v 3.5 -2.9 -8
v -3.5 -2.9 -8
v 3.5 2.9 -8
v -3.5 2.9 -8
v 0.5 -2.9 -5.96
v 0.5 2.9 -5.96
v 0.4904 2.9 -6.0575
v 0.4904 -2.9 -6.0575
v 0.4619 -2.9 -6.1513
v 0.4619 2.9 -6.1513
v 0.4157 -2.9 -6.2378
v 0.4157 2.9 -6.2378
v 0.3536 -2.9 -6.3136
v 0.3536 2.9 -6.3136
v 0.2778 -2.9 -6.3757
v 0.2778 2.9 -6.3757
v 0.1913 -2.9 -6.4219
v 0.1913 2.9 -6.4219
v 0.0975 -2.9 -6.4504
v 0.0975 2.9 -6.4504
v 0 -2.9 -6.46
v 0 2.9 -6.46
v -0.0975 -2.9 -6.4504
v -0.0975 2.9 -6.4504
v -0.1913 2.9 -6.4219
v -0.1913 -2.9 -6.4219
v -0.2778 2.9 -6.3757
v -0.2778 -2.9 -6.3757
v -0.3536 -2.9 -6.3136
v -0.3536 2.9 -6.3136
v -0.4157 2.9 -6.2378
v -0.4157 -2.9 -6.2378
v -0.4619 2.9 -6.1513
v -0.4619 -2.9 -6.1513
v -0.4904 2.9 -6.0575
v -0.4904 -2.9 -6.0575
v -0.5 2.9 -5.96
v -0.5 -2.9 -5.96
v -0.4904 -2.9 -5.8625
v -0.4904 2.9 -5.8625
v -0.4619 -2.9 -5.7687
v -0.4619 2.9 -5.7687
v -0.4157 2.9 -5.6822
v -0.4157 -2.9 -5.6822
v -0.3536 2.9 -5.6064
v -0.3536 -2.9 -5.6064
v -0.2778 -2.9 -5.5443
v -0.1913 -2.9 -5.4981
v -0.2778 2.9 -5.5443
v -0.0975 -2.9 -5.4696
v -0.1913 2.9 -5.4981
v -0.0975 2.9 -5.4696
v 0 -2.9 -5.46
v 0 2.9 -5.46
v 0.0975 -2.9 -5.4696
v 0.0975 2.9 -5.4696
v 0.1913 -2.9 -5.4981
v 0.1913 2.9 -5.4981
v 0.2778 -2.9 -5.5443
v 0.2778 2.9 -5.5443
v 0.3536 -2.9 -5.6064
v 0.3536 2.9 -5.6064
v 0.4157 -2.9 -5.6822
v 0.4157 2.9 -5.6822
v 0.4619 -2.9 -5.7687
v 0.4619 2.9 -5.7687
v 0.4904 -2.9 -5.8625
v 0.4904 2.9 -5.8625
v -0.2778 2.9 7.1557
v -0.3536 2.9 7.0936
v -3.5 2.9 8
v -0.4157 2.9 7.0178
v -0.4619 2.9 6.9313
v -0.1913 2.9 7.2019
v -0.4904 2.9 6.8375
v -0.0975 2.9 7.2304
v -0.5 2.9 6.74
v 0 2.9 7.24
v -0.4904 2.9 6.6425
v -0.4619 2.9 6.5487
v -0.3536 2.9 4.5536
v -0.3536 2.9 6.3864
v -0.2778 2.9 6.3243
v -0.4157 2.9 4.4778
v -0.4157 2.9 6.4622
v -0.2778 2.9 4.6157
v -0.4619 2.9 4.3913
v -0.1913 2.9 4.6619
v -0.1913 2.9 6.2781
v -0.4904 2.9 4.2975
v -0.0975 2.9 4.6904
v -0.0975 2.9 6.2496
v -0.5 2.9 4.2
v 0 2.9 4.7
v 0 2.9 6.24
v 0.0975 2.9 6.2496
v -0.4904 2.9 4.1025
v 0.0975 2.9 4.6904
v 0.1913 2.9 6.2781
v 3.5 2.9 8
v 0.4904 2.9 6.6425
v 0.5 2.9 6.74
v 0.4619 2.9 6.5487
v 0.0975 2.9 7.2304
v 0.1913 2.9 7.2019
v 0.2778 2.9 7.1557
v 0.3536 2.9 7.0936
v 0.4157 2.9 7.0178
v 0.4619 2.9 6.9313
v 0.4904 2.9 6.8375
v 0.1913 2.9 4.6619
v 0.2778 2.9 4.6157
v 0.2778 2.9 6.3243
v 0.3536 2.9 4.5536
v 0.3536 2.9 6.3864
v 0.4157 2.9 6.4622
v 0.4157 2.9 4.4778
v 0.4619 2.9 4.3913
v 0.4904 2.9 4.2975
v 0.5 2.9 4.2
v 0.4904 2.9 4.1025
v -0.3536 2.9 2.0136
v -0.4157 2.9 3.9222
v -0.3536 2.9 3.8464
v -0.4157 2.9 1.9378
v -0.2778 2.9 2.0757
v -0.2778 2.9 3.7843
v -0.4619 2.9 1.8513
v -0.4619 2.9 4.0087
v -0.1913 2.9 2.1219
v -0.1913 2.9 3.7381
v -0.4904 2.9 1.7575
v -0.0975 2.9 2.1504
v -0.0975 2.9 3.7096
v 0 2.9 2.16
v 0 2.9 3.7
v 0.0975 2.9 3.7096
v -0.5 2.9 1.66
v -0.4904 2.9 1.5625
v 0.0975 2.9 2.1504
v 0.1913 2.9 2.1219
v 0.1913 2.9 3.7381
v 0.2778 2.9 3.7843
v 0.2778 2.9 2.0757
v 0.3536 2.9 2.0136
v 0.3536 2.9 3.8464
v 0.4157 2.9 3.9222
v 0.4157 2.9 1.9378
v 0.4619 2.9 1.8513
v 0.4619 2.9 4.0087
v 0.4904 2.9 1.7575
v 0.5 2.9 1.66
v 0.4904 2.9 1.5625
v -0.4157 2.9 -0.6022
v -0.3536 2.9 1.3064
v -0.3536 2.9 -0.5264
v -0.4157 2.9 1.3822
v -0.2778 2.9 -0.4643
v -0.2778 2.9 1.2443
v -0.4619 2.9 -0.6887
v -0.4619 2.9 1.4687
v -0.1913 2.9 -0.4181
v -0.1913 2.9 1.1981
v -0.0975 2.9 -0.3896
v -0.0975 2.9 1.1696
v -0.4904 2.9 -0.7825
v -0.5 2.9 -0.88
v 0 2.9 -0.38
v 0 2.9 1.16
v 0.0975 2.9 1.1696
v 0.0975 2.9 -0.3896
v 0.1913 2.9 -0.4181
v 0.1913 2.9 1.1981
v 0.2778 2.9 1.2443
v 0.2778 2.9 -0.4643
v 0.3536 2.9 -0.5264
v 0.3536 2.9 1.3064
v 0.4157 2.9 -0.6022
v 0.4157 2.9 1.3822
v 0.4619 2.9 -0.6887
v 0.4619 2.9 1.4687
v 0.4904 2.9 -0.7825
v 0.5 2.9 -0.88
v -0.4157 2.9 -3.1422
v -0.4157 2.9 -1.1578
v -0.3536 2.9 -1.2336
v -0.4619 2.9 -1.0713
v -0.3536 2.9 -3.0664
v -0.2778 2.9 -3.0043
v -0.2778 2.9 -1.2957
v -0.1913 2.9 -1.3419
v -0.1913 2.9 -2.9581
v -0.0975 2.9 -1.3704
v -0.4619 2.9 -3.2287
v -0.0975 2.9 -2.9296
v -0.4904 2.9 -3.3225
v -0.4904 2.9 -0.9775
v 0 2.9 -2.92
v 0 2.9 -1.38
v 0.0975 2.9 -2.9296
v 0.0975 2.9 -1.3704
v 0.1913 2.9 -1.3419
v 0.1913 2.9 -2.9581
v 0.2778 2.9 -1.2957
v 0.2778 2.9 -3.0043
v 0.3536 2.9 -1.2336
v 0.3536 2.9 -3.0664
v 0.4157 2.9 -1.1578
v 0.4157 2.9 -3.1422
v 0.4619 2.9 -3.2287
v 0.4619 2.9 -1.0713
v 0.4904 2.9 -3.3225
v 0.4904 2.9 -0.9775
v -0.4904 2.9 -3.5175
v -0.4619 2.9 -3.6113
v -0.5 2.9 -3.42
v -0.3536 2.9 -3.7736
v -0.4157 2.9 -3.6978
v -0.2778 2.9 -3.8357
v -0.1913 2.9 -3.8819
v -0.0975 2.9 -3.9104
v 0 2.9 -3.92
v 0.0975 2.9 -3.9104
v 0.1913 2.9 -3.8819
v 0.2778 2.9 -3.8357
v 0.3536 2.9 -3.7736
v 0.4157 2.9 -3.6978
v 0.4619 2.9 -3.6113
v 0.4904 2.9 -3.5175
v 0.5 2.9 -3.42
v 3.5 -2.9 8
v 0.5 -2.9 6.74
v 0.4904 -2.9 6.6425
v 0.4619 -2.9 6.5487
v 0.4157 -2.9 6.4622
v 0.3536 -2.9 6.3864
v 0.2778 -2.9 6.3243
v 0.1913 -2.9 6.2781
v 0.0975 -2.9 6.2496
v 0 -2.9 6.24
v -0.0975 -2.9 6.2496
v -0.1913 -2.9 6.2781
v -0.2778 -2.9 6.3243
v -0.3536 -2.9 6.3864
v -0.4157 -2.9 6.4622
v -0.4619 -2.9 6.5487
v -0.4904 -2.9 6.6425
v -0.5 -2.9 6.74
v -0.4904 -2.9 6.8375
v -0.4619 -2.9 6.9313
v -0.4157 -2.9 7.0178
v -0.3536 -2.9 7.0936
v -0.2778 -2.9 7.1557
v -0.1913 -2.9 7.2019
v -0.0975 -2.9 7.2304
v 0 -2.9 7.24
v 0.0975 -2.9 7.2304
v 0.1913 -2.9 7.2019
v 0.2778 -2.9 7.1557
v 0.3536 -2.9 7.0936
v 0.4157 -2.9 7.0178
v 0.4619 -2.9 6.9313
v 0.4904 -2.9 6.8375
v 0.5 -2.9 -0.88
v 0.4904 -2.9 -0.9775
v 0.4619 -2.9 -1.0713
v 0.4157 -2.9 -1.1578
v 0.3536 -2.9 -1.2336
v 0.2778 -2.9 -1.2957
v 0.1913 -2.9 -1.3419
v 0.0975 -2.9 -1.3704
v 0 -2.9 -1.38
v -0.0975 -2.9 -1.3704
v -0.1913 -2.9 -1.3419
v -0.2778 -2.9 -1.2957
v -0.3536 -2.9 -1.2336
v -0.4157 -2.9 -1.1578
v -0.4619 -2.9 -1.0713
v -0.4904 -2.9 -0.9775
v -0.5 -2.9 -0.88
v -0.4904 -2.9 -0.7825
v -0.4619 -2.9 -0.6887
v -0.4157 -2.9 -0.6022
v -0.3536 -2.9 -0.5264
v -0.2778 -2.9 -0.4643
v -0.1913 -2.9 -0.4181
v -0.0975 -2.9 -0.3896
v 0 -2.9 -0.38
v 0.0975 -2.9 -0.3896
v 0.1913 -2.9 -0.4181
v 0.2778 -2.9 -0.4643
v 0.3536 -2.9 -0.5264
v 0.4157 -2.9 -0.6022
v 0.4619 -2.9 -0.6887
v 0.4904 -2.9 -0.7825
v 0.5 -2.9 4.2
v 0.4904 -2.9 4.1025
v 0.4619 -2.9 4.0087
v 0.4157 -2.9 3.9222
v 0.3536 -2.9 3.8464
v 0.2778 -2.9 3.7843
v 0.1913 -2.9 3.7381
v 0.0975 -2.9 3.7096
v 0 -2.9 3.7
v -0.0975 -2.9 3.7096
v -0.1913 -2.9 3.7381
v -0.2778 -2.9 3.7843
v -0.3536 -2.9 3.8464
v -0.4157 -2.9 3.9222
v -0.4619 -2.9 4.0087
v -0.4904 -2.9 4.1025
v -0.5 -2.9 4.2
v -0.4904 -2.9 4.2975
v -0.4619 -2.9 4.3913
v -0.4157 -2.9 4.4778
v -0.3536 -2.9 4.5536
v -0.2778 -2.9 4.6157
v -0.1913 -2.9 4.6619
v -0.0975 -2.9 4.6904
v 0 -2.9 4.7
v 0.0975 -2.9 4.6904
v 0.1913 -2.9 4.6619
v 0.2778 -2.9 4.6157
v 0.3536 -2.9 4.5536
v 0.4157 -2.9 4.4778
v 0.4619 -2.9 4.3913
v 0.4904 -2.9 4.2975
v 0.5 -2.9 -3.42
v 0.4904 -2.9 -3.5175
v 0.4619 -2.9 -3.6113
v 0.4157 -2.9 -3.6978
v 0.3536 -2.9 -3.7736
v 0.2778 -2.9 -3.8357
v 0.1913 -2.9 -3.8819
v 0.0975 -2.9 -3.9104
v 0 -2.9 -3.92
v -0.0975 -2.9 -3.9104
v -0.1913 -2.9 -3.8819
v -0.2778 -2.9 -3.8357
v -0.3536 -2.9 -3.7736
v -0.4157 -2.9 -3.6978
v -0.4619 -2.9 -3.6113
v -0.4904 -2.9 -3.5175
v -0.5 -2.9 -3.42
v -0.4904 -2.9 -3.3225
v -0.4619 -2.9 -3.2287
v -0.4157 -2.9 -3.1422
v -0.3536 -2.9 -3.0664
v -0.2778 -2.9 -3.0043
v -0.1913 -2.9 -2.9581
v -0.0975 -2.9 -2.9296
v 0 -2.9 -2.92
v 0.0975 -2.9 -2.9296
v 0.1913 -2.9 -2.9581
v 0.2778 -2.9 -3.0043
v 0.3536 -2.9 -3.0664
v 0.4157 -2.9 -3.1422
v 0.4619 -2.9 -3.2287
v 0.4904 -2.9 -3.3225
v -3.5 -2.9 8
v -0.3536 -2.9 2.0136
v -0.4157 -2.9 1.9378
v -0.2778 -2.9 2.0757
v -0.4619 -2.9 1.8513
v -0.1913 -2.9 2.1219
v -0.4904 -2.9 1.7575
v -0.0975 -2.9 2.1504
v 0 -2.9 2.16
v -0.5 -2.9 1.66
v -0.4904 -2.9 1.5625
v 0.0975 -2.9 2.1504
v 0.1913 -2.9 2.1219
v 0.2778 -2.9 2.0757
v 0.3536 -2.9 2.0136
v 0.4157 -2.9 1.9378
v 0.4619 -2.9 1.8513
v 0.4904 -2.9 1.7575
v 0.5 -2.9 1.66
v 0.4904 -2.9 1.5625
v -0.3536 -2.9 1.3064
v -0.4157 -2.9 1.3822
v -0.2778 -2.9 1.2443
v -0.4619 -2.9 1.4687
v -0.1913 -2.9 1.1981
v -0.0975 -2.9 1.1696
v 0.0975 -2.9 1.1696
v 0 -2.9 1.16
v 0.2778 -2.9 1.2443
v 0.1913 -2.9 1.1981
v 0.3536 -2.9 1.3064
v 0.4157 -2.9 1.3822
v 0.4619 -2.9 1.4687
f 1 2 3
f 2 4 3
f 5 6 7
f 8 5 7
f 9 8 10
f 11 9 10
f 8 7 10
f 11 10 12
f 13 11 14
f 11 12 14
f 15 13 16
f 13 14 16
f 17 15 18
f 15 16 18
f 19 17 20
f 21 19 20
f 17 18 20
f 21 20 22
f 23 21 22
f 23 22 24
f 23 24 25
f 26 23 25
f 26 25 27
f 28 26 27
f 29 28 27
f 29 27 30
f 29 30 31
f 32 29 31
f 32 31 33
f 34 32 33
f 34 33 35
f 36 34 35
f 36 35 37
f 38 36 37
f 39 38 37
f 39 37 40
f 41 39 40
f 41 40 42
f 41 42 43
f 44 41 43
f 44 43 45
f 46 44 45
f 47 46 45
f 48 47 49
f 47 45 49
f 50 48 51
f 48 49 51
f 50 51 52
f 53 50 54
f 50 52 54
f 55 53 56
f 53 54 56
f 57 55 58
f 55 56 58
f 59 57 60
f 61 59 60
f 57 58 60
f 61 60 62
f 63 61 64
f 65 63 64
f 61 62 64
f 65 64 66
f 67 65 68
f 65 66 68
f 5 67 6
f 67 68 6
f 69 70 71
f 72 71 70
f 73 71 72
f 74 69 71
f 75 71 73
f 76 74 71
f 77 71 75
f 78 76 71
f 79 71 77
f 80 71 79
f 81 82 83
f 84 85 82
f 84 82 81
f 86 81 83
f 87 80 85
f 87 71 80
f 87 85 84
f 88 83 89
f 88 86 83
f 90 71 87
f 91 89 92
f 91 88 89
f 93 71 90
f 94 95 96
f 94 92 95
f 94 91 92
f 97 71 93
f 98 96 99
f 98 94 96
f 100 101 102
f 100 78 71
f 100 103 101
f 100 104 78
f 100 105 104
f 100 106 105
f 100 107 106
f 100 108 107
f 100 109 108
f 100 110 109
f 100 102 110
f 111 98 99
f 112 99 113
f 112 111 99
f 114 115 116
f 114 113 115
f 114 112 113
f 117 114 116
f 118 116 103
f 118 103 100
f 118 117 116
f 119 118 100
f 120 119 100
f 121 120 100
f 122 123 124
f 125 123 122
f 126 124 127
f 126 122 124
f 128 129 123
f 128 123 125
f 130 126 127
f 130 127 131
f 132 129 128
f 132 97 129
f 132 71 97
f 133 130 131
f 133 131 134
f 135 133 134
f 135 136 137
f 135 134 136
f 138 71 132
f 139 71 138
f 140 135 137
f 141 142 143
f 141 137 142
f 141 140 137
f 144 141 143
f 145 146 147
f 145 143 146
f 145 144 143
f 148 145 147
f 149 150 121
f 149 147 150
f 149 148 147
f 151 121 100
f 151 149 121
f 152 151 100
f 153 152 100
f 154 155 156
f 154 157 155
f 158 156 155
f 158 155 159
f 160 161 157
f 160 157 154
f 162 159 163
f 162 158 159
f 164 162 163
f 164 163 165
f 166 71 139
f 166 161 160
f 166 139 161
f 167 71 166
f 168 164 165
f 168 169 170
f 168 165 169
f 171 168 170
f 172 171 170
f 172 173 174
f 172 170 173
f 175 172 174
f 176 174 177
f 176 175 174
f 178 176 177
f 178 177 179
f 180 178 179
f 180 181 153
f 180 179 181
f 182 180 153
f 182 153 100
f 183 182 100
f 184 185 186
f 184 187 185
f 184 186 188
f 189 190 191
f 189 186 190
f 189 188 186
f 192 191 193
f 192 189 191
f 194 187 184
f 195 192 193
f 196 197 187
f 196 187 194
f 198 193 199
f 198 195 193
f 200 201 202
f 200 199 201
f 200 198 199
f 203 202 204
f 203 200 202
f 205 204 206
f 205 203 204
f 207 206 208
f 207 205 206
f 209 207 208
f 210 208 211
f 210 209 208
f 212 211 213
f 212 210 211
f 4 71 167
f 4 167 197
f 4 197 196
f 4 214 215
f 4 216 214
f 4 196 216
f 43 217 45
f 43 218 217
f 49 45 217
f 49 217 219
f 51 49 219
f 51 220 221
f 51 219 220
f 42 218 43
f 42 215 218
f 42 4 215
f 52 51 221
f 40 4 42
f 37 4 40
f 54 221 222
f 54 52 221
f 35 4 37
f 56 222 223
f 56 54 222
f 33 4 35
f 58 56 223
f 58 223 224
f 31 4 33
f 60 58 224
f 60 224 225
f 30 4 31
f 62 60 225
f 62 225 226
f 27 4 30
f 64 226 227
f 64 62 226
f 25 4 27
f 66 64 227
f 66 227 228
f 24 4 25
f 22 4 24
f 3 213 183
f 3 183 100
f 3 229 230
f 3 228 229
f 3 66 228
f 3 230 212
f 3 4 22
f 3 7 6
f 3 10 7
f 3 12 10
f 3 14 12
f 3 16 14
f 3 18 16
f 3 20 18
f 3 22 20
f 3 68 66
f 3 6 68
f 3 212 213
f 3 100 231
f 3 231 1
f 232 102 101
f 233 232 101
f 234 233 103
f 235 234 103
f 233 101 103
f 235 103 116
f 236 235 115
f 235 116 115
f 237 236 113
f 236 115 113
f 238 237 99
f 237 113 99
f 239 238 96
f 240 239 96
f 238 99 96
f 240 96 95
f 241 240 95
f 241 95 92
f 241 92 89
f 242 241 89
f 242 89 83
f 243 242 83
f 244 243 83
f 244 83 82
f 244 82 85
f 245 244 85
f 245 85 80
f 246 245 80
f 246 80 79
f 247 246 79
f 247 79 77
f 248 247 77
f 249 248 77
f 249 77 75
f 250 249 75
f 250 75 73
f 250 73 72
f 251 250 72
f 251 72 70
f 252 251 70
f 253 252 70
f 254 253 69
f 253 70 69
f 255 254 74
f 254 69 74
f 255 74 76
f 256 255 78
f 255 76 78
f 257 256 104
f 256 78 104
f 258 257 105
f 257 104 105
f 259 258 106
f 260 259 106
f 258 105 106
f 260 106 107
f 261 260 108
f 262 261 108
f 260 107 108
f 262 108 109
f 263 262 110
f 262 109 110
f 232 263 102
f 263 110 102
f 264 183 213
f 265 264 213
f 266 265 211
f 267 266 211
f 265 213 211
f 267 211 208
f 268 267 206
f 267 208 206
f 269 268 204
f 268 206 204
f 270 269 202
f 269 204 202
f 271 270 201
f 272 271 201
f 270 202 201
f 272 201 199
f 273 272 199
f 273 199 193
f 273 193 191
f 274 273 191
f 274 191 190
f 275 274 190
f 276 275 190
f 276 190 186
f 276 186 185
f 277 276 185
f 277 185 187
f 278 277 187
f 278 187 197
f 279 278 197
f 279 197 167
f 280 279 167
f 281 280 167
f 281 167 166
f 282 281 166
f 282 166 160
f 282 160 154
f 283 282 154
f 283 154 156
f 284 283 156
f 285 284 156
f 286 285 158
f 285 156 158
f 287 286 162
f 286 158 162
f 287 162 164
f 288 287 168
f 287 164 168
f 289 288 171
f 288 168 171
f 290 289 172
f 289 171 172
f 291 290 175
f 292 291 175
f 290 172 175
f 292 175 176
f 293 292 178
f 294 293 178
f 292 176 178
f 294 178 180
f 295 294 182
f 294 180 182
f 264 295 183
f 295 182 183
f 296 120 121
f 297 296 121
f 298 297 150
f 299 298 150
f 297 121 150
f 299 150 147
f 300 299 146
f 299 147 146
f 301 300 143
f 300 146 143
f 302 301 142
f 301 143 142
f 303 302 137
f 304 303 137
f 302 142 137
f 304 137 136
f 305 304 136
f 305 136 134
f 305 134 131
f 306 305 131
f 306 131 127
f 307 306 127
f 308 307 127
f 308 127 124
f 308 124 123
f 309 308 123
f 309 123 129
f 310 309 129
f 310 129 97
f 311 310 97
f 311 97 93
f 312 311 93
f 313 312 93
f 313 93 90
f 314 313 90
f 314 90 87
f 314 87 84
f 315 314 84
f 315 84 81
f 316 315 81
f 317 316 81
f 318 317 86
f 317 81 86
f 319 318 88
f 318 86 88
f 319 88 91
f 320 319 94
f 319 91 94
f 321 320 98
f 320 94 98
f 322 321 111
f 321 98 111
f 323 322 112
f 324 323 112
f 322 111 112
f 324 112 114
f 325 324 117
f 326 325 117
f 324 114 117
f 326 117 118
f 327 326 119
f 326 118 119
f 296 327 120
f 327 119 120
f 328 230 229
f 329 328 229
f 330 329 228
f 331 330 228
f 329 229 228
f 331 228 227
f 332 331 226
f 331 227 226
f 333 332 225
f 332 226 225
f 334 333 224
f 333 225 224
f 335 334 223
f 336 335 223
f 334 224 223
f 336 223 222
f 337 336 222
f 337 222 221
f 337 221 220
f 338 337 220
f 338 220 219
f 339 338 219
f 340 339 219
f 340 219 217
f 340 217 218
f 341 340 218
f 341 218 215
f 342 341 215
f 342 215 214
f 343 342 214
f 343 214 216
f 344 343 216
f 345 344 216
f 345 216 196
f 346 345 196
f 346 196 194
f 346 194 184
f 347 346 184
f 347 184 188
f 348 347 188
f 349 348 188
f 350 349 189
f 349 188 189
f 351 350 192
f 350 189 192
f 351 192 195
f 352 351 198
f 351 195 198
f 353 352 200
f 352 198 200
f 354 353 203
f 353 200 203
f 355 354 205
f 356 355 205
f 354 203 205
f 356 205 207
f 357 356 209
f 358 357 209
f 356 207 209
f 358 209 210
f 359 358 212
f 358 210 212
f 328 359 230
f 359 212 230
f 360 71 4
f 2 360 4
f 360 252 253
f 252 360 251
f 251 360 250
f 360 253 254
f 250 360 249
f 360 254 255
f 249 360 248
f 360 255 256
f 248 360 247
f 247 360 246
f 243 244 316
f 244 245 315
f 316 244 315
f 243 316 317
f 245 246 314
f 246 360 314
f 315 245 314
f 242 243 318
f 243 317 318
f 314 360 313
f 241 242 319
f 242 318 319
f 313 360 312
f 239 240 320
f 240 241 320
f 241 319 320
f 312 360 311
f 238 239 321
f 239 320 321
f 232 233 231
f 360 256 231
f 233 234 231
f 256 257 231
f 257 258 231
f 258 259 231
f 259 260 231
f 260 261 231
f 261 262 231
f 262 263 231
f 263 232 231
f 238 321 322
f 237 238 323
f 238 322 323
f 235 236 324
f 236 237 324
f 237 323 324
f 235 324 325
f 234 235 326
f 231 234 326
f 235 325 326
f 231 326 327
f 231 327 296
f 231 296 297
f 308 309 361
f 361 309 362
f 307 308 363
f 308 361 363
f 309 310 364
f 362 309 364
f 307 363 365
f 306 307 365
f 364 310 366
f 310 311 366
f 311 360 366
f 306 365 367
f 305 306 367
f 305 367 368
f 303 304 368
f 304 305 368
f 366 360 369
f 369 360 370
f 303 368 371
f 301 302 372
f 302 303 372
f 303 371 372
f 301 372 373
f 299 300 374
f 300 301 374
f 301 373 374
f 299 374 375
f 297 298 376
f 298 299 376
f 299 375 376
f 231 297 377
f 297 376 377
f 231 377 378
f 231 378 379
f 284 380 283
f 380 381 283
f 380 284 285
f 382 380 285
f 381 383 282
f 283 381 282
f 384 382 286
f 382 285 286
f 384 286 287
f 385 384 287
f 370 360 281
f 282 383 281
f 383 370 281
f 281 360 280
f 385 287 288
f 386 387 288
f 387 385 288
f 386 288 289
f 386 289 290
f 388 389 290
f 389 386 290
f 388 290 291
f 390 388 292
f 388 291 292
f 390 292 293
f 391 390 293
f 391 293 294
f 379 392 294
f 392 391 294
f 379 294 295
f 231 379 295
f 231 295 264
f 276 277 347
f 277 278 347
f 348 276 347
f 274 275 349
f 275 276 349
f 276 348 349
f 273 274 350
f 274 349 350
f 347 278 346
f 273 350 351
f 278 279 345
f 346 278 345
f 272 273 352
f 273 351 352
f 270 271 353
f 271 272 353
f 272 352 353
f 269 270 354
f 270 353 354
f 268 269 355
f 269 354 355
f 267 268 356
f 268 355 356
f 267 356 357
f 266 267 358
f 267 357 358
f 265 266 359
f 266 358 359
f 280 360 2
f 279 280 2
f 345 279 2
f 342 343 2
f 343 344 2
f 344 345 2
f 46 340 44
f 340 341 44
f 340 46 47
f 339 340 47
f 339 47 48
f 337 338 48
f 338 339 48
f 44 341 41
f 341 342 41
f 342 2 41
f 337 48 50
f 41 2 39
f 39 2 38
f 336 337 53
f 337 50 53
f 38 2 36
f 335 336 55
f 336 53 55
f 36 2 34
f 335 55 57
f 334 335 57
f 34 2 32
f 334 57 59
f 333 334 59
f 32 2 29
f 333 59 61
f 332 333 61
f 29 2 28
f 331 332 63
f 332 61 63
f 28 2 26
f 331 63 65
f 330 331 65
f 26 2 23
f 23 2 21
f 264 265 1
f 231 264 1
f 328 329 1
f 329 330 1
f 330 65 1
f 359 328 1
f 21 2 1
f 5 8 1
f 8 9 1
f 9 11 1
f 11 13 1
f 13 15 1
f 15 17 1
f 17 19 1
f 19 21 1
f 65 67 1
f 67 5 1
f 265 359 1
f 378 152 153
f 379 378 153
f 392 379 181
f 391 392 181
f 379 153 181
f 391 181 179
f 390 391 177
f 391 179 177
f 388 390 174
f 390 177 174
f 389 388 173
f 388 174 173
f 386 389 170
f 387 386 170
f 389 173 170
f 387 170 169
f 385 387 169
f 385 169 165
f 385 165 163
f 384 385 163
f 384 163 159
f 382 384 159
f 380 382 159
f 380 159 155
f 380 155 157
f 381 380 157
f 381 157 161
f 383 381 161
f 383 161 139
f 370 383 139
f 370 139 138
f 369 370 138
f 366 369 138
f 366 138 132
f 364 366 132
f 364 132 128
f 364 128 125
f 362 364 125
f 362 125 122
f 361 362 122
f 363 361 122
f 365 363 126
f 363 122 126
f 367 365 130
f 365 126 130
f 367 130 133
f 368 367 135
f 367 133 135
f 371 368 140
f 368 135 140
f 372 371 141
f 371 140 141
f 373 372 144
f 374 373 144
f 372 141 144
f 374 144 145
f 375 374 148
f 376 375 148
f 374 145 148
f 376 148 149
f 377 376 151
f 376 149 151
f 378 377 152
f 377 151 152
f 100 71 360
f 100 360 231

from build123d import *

# Parameters (mm, degrees)
SKETCH1_W           = 7
SKETCH1_H           = 16
BOSS_EXTRUDE1_DEPTH = 2.9
SKETCH2_R           = 0.5
CUT_EXTRUDE1_DEPTH  = 6.8
LPATTERN1_COUNT     = 12
LPATTERN1_PITCH     = 2.54


with BuildPart() as part:
    # Sketch1 → Boss-Extrude1 (new body, symmetric)
    with BuildSketch(Plane(origin=(0, 0, 0), x_dir=(1, 0, 0), z_dir=(0, 1, 0))):
        Rectangle(SKETCH1_W, SKETCH1_H)
    extrude(amount=BOSS_EXTRUDE1_DEPTH, both=True)

    # Sketch2 → Cut-Extrude1 (cut, through all)
    with BuildSketch(Plane(origin=(0, 2.9, 0), x_dir=(1, 0, 0), z_dir=(0, 1, 0))):
        with Locations((0, 5.96)):
            Circle(SKETCH2_R)
    cut_extrude1 = extrude(amount=-CUT_EXTRUDE1_DEPTH, mode=Mode.SUBTRACT)

    # LPattern1: Cut-Extrude1 ×12
    with Locations(*[(0, 0, i * LPATTERN1_PITCH) for i in range(1, LPATTERN1_COUNT)]):
        add(cut_extrude1, mode=Mode.SUBTRACT)


solid = part.part
